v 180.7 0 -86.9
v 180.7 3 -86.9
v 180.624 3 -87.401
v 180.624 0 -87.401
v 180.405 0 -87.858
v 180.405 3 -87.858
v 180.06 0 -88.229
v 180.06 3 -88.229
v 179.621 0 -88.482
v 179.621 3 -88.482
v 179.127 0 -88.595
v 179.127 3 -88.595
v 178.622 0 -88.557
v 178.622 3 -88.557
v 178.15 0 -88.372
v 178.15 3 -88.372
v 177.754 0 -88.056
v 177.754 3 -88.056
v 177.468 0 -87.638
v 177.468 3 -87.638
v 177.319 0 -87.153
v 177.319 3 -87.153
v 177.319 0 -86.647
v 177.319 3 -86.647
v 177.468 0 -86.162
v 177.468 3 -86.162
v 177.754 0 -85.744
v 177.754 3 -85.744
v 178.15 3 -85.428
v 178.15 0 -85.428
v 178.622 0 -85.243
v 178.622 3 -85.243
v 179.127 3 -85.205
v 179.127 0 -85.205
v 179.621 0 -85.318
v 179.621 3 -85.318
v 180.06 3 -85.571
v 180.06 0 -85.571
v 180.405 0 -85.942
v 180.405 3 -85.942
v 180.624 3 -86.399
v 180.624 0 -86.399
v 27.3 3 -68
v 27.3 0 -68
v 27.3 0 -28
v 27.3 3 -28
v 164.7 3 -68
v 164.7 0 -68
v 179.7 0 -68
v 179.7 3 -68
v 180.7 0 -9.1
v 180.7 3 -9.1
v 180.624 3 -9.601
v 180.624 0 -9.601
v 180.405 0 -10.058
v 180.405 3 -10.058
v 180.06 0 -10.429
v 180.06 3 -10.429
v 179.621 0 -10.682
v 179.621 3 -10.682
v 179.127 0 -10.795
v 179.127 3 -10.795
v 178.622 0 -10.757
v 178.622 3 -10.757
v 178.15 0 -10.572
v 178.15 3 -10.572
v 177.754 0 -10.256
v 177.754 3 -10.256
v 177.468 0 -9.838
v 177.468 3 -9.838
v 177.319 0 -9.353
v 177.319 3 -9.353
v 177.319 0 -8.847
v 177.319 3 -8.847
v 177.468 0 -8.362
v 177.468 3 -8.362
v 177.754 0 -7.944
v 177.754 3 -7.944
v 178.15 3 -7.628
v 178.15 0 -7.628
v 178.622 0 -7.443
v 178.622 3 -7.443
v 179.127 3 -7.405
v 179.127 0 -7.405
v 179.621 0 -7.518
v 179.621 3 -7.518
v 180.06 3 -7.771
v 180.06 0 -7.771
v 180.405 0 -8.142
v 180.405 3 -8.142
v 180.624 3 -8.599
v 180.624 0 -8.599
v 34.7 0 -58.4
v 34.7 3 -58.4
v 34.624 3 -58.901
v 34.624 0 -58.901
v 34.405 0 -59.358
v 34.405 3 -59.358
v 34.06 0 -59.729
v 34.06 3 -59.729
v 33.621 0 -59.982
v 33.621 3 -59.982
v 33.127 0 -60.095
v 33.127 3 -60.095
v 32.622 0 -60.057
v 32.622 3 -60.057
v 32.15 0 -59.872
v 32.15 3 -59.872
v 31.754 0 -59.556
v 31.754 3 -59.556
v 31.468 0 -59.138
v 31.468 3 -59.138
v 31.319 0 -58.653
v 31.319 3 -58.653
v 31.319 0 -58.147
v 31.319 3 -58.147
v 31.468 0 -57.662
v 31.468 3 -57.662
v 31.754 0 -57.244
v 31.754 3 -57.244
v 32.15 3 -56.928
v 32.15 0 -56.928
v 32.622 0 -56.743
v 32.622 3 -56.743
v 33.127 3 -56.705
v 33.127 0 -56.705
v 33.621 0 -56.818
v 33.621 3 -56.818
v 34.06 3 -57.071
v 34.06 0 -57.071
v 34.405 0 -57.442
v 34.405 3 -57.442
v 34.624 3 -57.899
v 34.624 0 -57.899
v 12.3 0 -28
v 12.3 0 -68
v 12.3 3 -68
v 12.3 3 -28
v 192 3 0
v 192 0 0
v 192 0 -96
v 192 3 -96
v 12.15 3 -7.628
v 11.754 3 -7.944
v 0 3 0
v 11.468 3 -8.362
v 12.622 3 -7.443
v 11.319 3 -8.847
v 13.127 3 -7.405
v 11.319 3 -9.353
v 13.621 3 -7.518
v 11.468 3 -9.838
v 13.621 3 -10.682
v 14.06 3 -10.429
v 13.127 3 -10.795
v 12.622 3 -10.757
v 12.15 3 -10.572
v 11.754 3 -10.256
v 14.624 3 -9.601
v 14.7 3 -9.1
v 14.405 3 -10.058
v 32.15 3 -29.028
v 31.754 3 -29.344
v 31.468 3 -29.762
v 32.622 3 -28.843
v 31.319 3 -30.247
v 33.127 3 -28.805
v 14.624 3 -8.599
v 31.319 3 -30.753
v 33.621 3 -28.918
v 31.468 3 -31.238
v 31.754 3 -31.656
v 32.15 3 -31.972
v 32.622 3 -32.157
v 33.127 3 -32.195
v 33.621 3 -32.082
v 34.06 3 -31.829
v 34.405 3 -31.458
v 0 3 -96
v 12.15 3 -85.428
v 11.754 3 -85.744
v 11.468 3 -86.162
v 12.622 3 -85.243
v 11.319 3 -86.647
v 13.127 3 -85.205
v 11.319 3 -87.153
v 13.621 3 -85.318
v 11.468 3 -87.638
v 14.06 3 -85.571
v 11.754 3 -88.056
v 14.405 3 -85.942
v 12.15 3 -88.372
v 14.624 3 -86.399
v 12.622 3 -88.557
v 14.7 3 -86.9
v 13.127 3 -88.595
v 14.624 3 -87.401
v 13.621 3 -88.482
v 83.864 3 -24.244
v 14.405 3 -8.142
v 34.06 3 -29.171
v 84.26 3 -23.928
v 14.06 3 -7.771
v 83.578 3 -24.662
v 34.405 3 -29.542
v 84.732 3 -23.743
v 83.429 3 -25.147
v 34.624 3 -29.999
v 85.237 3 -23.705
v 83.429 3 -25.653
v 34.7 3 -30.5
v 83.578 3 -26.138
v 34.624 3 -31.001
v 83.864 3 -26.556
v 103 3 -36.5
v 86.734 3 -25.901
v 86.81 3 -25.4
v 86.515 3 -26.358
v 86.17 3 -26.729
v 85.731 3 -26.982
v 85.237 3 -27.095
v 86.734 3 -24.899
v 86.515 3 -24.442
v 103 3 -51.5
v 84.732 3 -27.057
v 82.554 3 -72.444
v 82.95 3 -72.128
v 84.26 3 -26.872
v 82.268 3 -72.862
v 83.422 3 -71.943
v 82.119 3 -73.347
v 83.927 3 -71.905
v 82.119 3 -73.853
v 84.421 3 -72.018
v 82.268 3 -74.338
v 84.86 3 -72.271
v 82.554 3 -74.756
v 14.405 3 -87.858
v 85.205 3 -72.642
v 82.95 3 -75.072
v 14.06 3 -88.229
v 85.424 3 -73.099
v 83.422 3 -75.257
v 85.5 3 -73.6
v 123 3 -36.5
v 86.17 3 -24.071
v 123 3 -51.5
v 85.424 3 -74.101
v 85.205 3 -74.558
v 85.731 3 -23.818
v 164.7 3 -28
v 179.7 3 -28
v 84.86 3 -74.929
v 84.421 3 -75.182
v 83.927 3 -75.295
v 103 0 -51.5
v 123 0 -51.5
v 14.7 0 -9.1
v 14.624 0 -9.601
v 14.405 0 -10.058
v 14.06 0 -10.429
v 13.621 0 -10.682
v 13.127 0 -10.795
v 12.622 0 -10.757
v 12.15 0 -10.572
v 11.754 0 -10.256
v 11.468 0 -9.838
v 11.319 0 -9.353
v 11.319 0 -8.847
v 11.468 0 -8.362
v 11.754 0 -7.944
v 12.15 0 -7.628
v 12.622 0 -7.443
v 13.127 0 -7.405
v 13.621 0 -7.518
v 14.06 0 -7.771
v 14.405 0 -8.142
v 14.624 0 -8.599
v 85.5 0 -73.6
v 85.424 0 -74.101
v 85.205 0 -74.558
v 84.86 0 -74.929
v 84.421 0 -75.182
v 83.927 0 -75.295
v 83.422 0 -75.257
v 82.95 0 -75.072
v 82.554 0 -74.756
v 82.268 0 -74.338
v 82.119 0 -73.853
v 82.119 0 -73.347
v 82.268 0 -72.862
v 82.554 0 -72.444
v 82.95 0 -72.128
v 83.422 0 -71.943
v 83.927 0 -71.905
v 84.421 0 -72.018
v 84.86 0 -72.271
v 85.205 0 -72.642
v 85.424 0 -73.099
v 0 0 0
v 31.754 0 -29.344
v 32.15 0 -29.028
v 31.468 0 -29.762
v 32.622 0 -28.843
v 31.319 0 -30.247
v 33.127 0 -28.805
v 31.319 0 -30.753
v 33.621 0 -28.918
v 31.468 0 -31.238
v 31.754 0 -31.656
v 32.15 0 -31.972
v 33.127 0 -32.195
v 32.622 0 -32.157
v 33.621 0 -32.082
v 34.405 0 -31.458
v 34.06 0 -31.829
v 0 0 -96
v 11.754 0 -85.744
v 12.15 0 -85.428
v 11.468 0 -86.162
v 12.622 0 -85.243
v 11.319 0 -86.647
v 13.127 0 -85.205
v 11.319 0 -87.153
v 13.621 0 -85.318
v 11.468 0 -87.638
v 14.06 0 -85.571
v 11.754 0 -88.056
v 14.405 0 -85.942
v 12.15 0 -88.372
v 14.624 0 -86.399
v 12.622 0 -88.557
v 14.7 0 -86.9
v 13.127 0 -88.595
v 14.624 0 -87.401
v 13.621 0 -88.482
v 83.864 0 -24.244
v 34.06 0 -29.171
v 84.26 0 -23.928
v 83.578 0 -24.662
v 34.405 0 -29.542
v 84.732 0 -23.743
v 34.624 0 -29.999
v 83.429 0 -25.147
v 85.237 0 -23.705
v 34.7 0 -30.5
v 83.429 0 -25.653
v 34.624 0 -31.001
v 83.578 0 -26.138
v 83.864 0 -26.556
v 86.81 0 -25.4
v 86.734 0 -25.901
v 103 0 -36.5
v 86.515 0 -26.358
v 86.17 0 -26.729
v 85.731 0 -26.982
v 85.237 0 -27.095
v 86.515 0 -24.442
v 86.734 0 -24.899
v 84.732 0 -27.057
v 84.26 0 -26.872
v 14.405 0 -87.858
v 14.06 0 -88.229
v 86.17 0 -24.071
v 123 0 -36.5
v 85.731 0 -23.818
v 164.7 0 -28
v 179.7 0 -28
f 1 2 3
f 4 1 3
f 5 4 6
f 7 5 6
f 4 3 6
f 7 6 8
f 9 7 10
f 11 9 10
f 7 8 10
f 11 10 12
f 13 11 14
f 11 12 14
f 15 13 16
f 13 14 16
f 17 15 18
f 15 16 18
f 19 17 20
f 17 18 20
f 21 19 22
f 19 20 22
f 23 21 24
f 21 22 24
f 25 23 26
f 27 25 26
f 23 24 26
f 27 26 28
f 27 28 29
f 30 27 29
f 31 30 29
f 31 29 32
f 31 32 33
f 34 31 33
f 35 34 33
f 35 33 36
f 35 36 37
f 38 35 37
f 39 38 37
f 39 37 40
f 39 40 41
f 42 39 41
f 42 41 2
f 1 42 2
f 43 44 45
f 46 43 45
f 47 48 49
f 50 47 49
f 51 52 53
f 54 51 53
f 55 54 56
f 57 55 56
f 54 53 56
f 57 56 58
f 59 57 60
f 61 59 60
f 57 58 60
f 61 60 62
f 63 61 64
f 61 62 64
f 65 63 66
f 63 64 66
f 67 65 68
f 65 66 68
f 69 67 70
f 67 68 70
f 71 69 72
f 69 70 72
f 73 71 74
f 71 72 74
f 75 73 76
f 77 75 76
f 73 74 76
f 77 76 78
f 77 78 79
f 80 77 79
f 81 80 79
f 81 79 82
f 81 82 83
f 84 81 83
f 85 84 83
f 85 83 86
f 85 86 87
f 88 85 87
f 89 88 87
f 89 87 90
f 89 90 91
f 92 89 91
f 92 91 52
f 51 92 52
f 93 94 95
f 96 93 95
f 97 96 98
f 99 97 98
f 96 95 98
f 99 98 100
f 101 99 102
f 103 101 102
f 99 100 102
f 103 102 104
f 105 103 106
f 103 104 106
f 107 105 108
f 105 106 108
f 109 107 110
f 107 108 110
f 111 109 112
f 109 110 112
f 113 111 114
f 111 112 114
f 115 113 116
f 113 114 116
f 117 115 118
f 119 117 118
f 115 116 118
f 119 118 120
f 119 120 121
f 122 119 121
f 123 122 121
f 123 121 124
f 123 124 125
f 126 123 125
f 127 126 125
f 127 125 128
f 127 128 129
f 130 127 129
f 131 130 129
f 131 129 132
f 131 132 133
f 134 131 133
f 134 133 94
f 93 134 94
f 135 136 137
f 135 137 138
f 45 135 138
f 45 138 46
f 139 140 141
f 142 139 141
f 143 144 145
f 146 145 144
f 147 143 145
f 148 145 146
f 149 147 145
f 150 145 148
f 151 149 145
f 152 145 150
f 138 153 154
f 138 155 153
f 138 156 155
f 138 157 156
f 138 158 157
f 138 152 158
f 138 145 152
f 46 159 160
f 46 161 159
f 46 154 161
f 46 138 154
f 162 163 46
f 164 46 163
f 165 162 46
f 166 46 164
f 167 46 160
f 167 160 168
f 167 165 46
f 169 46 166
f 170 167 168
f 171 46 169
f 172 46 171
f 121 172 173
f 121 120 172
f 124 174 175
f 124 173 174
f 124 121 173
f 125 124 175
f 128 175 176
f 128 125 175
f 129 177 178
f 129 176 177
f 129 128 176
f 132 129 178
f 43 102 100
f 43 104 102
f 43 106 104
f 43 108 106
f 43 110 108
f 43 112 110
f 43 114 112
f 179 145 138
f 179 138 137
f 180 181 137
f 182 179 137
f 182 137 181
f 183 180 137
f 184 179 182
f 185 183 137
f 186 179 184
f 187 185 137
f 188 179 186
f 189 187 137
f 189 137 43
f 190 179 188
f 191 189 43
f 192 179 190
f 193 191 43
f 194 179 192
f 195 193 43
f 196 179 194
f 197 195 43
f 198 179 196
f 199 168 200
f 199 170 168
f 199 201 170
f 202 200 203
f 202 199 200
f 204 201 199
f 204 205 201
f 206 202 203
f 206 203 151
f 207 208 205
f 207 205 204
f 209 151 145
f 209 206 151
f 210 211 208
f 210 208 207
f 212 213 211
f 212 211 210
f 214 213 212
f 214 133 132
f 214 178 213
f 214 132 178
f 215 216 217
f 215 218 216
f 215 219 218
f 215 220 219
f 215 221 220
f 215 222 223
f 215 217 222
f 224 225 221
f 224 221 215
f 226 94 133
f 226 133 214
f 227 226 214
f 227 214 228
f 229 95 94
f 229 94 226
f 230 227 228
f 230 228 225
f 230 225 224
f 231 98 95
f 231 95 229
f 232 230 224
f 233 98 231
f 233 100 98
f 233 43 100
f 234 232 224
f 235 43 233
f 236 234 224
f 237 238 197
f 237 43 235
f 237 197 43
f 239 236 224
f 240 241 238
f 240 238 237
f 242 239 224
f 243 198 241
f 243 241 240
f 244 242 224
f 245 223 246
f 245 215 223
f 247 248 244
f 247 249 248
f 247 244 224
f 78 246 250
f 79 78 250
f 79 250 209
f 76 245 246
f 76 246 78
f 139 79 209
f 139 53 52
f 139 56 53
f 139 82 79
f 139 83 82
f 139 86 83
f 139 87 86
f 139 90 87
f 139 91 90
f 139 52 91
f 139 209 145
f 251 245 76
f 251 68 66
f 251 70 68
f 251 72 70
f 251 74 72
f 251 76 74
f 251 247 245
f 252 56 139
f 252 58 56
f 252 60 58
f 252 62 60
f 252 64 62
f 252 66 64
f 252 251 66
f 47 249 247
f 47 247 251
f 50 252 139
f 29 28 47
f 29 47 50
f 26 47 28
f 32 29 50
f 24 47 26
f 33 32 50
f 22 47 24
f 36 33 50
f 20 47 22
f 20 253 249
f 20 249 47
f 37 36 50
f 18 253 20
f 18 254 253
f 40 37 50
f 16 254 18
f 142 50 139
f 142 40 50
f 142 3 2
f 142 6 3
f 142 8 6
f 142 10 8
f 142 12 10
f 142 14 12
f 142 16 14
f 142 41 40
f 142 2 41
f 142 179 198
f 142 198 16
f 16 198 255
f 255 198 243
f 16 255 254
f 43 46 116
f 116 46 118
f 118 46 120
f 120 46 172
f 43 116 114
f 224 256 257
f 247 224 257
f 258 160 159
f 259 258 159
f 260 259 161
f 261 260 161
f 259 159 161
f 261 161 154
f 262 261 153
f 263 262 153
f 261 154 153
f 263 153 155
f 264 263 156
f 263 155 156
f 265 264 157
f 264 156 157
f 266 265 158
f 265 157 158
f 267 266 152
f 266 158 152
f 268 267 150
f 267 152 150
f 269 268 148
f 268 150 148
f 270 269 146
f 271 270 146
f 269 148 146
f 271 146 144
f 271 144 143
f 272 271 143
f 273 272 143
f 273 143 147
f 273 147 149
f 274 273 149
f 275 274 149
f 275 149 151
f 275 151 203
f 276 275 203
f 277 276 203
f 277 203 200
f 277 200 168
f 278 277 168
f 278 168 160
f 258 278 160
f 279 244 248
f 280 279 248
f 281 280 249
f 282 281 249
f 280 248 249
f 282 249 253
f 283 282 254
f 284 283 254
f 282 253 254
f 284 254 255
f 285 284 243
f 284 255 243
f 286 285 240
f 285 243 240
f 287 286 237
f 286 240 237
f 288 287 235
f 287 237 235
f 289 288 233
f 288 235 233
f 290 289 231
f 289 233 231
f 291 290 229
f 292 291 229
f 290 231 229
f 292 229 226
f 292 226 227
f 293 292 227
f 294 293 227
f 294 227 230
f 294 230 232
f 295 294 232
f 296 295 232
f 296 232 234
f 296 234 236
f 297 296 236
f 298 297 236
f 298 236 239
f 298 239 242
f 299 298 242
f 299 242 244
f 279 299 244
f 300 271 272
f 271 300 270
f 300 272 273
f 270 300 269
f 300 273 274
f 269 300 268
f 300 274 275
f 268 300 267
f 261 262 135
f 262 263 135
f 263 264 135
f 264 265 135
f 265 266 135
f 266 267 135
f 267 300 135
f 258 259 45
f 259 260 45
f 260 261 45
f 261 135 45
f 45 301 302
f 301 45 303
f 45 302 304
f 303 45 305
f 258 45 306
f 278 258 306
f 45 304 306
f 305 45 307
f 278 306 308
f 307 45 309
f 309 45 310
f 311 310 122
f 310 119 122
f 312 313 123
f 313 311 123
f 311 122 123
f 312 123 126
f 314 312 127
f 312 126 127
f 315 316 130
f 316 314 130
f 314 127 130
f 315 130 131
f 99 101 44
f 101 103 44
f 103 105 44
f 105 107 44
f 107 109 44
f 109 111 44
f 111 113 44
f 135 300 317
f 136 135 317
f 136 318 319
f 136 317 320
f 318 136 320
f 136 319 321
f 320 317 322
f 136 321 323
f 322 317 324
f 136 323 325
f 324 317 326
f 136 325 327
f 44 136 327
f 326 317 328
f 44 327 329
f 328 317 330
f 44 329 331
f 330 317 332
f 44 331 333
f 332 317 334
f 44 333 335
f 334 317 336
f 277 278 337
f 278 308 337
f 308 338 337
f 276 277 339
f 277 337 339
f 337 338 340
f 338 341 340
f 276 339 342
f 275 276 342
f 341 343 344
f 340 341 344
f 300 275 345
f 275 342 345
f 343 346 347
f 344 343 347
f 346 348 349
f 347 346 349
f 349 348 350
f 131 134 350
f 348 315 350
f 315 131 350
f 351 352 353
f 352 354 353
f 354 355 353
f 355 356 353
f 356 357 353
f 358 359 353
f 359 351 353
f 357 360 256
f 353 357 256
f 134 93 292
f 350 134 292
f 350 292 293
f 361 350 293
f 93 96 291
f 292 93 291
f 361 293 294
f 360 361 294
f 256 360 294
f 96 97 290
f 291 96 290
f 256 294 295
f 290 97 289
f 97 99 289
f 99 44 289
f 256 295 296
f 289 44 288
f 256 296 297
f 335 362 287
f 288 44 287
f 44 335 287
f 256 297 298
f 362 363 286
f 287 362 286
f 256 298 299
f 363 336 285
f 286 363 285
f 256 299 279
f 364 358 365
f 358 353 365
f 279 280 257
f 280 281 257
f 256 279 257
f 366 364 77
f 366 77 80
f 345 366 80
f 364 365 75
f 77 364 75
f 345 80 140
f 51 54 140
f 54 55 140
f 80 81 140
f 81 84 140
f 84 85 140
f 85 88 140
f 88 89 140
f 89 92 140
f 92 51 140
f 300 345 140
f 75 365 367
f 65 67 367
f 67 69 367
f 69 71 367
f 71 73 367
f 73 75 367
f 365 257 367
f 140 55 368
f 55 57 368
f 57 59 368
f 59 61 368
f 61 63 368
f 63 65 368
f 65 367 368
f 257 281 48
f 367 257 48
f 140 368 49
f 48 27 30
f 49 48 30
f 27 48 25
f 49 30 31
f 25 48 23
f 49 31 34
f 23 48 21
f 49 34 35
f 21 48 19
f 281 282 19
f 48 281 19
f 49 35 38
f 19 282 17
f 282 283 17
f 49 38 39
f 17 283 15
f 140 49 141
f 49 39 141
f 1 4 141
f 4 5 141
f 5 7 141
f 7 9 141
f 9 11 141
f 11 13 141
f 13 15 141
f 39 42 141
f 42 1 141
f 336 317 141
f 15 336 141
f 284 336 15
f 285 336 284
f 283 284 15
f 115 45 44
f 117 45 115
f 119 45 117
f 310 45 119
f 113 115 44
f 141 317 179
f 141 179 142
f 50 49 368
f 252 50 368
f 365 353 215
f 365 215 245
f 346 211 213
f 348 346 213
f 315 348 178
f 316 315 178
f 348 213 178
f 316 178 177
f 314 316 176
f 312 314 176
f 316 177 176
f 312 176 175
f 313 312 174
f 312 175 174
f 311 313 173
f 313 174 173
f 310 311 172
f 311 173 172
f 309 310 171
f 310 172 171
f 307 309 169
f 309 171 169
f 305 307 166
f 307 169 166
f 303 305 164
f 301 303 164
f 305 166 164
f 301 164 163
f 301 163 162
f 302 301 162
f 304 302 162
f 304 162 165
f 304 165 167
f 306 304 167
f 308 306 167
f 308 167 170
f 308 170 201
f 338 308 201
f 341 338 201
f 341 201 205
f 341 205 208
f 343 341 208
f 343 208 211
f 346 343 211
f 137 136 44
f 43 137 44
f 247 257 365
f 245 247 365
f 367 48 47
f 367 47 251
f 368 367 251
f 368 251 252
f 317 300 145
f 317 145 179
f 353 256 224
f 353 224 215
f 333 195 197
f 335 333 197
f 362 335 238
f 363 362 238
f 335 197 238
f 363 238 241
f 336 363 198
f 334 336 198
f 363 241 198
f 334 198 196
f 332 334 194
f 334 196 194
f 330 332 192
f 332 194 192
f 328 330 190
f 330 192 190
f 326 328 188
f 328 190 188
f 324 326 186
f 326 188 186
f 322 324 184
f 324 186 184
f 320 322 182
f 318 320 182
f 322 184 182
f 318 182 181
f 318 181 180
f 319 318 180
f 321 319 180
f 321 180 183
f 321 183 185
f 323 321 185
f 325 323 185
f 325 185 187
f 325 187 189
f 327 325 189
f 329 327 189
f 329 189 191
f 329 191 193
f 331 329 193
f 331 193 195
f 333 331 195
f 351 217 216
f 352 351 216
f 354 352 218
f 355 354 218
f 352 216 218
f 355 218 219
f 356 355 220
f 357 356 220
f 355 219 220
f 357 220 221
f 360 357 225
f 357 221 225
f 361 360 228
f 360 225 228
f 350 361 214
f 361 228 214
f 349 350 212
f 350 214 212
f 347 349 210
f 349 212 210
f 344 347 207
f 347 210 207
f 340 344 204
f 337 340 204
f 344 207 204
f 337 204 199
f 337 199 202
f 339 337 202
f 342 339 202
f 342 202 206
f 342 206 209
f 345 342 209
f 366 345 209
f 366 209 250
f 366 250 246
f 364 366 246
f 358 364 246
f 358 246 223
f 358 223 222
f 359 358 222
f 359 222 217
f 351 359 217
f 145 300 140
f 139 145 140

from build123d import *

# Parameters (mm, degrees)
SKETCH1_W            = 192
SKETCH1_H            = 96
BOSS_EXTRUDE1_DEPTH  = 3
M3_CLEARANCE_HOLE1_D = 3.4
SKETCH6_W            = 15
SKETCH6_H            = 40
SKETCH6_W_2          = 20
SKETCH6_H_2          = 15
CUT_EXTRUDE1_DEPTH   = 215.683487954
M3_CLEARANCE_HOLE2_D = 3.4


with BuildPart() as part:
    # Sketch1 → Boss-Extrude1 (new body)
    with BuildSketch(Plane(origin=(0, 0, 0), x_dir=(1, 0, 0), z_dir=(0, 1, 0))):
        with Locations((96, 48)):
            Rectangle(SKETCH1_W, SKETCH1_H)
    extrude(amount=BOSS_EXTRUDE1_DEPTH)

    # M3 Clearance Hole1 (through all)
    with Locations(Plane(origin=(0, 0, 0), x_dir=(-1, 0, 0), z_dir=(0, -1, 0))):
        with Locations((-13, 9.1), (-179, 9.1), (-179, 86.9), (-13, 86.9)):
            Hole(M3_CLEARANCE_HOLE1_D / 2)

    # Sketch6 → Cut-Extrude1 (cut, through all)
    with BuildSketch(Plane.XZ):
        with Locations((19.8, -48)):
            Rectangle(SKETCH6_W, SKETCH6_H)
        with Locations((172.2, -48)):
            Rectangle(SKETCH6_W, SKETCH6_H)
        with Locations((113, -44)):
            Rectangle(SKETCH6_W_2, SKETCH6_H_2)
    extrude(amount=-CUT_EXTRUDE1_DEPTH, mode=Mode.SUBTRACT)

    # M3 Clearance Hole2 (through all)
    with Locations(Plane(origin=(0, 0, 0), x_dir=(-1, 0, 0), z_dir=(0, -1, 0))):
        with Locations((-33, 58.4), (-33, 30.5), (-85.11, 25.4), (-83.8, 73.6)):
            Hole(M3_CLEARANCE_HOLE2_D / 2)


solid = part.part
